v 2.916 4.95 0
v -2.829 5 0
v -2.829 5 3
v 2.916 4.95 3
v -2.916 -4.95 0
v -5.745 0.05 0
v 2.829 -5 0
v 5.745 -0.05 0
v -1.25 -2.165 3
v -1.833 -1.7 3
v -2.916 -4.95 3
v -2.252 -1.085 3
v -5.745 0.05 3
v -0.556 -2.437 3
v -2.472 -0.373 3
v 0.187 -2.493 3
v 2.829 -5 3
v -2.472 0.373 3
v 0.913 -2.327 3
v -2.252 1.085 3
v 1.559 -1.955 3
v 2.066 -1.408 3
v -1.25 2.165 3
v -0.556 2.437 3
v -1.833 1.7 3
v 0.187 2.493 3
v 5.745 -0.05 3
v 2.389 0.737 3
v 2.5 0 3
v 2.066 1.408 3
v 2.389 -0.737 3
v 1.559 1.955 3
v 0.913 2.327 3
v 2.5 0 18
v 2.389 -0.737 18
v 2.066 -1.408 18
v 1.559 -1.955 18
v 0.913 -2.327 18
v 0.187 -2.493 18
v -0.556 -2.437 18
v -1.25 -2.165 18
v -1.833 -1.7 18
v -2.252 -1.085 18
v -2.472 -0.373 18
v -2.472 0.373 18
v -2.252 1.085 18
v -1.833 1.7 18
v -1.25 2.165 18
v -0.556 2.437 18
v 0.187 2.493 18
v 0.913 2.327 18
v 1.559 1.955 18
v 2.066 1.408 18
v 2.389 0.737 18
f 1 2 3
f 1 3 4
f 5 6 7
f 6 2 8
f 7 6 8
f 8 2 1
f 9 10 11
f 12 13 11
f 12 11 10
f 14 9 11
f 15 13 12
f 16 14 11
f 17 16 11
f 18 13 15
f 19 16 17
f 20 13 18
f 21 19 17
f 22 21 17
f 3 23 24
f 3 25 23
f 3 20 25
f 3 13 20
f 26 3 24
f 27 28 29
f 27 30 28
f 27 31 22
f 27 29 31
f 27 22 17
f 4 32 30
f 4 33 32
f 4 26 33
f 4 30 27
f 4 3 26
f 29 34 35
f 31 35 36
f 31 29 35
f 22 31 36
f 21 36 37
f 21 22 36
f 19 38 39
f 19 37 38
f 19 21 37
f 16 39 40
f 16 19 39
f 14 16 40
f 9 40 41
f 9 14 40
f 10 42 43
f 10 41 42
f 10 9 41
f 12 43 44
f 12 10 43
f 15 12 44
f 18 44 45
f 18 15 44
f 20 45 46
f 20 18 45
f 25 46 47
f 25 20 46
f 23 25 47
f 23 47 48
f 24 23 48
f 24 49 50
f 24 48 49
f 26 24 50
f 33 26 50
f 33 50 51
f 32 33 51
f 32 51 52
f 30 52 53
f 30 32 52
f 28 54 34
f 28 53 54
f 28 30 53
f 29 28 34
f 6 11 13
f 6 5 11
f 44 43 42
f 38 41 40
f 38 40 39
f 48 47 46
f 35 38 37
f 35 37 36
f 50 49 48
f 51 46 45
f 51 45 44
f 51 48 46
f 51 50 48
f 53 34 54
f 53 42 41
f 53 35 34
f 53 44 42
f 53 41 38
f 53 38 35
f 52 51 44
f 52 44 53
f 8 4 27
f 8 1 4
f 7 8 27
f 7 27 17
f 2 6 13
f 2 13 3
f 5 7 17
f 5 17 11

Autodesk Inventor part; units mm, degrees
ref_plane "YZ Plane" through (0, 0, 0) normal (1, 0, 0) x (0, 1, 0)
ref_plane "XZ Plane" through (0, 0, 0) normal (0, 1, 0) x (-1, 0, 0)
ref_plane "XY Plane" through (0, 0, 0) normal (0, 0, 1) x (1, 0, 0)
sketch "Sketch1" plane through (0, 0, 0) normal (0, 0, 1) x (1, 0, 0)
  circle A0 centre (0, 0) radius 2.5
  circle A1 centre (0, 0) radius 5
  line L0 (2.8292, -5) -> (-2.9155, -4.9502)
  line L1 (-2.9155, -4.9502) -> (-5.7447, 0.0498)
  line L2 (-5.7447, 0.0498) -> (-2.8292, 5)
  line L3 (-2.8292, 5) -> (2.9155, 4.9502)
  line L4 (2.9155, 4.9502) -> (5.7447, -0.0498)
  line L5 (5.7447, -0.0498) -> (2.8292, -5)
  dimension "d0" = 5
  dimension "d1" = 10
extrude "Extrusion1" add sketch "Sketch1" along normal blind 3 contours A0 | A1 L5 L0 L1 L2 L3 L4 | A1 L4 L5 | A1 L3 L4 | L5 L0 A1 | A1 L2 L3 | L0 L1 A1 | A1 L1 L2
sketch "Sketch2" plane through (0, 0, 3) normal (0, 0, 1) x (1, 0, 0)
  circle A0 centre (0, 0) radius 2.5
  dimension "d4" = 5
extrude "Extrusion2" add sketch "Sketch2" along normal blind 15
thread "Thread1" size "M5x0.8" class "6g" standard "ANSI Metric M Profile" full length
sketch "Sketch3" plane through (0, 0, 0) normal (0, 0, -1) x (-1, 0, 0)
  point P0 (0, 0)
properties part number "Screw"
